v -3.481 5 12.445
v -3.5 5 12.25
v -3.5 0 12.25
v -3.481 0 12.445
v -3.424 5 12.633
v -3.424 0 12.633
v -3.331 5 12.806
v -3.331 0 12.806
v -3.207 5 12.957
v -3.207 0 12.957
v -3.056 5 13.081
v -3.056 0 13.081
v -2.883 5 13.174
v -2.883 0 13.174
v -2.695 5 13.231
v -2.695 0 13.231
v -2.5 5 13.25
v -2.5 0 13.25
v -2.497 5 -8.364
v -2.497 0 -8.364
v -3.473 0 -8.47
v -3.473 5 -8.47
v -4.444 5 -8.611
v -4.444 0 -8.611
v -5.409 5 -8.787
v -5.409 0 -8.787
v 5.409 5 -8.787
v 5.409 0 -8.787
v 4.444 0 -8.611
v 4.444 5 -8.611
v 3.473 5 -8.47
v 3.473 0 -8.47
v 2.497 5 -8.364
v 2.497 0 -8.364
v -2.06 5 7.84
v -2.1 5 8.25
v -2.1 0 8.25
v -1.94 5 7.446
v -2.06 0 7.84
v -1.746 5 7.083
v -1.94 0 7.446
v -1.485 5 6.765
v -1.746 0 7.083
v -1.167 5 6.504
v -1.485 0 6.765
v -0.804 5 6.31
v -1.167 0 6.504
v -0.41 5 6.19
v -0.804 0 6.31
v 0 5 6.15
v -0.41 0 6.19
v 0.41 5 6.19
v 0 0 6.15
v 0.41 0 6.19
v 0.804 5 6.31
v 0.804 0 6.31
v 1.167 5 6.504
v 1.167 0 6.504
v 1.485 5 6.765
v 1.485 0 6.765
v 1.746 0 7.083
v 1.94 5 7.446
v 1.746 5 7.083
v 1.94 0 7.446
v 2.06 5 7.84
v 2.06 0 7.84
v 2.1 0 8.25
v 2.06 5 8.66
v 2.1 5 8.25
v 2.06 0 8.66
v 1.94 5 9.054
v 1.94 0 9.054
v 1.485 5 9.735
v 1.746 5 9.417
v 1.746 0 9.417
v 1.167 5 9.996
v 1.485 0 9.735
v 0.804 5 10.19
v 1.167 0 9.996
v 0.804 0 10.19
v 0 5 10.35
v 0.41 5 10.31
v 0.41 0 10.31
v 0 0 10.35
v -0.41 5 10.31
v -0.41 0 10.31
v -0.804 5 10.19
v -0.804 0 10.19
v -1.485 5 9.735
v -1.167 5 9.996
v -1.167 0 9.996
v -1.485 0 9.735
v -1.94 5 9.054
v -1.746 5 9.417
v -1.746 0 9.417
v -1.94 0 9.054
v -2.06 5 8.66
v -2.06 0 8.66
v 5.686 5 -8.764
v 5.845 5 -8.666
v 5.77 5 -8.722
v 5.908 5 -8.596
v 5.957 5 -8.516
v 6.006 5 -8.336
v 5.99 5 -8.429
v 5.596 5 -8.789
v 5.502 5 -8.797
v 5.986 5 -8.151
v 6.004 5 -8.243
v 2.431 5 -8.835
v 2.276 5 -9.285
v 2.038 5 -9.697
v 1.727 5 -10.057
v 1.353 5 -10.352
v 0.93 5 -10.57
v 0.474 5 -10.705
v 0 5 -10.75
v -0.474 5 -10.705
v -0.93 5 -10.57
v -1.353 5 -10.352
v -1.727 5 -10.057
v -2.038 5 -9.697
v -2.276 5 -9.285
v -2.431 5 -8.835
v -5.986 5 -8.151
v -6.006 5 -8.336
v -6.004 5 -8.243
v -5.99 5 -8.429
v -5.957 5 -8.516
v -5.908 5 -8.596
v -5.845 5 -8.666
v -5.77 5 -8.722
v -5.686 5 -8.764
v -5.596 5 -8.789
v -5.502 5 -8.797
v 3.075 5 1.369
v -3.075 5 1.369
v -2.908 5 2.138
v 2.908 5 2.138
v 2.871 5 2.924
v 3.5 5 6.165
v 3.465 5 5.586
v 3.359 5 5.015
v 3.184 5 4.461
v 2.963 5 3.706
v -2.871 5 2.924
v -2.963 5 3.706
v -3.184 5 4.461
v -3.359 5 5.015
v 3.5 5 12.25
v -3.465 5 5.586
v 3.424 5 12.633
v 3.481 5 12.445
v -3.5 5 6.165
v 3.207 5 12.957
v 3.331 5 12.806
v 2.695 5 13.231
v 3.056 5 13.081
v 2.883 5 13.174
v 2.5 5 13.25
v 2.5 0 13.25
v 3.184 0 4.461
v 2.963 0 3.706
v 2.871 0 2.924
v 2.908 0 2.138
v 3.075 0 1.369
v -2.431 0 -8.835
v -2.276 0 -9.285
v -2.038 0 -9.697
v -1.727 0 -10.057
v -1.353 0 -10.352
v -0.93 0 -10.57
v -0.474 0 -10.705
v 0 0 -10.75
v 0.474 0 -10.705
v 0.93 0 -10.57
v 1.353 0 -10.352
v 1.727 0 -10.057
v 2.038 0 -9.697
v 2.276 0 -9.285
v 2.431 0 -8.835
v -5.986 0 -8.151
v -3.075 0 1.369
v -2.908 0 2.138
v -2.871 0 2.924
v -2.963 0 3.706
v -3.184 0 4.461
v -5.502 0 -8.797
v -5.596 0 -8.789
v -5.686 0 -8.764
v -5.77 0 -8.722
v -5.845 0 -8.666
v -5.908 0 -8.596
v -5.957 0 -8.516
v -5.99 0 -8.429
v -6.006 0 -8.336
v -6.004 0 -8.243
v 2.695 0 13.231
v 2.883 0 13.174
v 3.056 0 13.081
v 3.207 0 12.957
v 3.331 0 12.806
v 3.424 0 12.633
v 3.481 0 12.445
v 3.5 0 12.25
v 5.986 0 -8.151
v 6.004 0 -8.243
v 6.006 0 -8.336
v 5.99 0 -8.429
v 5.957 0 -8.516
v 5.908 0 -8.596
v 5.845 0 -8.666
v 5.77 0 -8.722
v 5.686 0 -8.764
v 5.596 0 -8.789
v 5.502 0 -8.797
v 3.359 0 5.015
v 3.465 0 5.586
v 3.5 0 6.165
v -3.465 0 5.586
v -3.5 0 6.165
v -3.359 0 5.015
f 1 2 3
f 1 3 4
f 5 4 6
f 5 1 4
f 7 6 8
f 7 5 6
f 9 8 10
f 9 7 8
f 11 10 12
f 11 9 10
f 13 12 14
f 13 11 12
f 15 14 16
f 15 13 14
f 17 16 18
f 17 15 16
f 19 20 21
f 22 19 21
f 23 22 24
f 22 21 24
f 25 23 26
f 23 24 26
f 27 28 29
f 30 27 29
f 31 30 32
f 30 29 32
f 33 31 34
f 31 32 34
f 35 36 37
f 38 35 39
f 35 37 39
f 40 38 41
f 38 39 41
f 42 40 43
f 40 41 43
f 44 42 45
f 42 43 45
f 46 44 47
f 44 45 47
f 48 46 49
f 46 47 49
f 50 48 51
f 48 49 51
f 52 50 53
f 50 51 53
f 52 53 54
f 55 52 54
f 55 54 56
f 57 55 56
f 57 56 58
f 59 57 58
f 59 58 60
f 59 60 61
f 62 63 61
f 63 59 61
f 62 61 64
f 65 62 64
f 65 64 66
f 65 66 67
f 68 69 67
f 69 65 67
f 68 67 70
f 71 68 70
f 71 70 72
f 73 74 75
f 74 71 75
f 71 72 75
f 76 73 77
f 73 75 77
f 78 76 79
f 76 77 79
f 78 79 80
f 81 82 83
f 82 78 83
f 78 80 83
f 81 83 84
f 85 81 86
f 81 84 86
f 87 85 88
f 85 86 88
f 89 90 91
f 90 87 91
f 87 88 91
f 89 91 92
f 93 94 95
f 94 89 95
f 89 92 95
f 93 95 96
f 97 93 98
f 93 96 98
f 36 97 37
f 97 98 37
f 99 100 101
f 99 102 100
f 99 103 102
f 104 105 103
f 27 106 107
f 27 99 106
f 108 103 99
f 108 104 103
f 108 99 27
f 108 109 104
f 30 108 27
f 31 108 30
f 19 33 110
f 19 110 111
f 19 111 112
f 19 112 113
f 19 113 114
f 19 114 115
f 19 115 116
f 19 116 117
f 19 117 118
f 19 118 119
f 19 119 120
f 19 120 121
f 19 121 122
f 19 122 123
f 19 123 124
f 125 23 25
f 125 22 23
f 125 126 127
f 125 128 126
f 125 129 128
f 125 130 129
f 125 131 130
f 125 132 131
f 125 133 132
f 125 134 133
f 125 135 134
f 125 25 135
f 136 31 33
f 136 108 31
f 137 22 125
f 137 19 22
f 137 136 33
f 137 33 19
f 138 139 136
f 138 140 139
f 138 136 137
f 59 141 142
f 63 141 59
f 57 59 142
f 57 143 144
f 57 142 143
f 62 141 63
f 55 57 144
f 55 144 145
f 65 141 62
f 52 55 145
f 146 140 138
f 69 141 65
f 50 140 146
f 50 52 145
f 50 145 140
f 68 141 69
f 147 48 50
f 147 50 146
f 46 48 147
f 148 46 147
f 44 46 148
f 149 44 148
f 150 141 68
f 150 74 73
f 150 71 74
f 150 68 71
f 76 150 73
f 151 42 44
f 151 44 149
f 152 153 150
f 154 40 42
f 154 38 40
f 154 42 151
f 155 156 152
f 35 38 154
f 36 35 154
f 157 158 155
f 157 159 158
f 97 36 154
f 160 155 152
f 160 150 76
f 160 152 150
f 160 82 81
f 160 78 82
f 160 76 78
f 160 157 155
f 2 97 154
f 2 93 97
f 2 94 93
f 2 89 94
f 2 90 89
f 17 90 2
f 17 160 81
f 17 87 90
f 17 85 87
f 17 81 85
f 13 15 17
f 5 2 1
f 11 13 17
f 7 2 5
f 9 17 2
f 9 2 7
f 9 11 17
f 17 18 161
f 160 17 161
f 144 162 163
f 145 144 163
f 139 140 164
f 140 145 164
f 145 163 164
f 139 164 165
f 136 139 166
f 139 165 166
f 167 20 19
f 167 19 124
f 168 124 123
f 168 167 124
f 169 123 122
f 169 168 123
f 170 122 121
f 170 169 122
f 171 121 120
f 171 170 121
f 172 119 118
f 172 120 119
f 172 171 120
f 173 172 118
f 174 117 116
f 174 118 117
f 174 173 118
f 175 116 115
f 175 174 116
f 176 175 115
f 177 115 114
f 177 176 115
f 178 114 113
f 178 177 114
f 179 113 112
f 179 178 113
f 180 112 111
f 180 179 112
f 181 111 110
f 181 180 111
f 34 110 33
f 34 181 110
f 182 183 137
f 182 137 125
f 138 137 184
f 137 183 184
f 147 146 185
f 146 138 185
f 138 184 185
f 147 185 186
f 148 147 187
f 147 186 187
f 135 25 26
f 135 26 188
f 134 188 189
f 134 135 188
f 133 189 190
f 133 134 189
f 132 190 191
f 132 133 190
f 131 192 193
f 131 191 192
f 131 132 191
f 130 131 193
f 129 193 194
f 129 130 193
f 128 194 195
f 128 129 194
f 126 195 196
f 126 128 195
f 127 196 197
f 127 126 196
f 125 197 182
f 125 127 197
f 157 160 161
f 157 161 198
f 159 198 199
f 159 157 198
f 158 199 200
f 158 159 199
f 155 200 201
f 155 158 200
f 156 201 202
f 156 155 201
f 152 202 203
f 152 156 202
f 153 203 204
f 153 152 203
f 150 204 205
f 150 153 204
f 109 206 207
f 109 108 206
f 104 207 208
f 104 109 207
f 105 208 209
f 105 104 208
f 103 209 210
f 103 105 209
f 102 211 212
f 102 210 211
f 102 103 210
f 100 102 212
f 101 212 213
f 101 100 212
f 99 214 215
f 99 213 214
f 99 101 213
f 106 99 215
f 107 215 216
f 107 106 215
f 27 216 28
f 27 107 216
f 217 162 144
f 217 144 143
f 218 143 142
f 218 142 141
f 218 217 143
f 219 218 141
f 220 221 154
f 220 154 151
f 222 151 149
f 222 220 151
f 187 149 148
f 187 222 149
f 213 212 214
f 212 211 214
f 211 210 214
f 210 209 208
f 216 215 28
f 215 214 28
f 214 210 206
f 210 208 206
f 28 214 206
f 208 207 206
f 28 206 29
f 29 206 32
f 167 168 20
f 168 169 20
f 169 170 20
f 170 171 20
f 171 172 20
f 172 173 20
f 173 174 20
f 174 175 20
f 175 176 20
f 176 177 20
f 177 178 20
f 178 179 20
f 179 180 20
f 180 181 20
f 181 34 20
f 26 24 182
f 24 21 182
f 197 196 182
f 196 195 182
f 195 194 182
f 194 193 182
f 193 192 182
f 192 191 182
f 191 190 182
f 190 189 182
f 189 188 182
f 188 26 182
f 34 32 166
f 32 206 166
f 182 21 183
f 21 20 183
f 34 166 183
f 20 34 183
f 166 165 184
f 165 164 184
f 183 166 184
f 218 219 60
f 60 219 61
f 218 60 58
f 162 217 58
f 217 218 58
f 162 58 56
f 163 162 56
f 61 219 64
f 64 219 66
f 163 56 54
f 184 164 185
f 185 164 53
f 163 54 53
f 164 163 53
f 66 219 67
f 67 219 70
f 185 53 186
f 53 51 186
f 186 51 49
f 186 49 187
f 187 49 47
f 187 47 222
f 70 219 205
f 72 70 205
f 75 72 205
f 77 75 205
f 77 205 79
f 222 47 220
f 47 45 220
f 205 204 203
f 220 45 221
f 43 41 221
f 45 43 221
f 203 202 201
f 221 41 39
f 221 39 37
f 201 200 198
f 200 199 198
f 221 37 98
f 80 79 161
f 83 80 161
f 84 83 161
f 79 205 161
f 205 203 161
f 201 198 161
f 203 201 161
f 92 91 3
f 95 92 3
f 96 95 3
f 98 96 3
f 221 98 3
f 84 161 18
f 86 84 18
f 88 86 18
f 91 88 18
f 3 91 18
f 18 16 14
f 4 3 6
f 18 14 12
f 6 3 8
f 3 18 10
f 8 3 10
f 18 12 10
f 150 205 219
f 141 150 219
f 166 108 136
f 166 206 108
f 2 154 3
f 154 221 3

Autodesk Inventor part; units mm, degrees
ref_plane "YZ Plane" through (0, 0, 0) normal (1, 0, 0) x (0, 1, 0)
ref_plane "XZ Plane" through (0, 0, 0) normal (0, 1, 0) x (-1, 0, 0)
ref_plane "XY Plane" through (0, 0, 0) normal (0, 0, 1) x (1, 0, 0)
sketch "Sketch1" plane through (0, 0, 0) normal (0, 1, 0) x (-1, 0, 0)
  line L0 (0, 8.25) -> (0, -8.25) construction
  line L1 (-2.5, 8.25) -> (-2.5, -8.25)
  line L2 (2.5, -8.25) -> (2.5, 8.25)
  arc A0 (2.5, 8.25) -> (-2.5, 8.25) centre (0, 8.25) ccw
  arc A1 (-2.5, -8.25) -> (2.5, -8.25) centre (0, -8.25) ccw
  circle A2 centre (0, 8.25) radius 2.1
  circle A3 centre (0, -8.25) radius 2.1
  line L3 (2.5, 13.25) -> (-2.5, 13.25)
  line L4 (-2.5, 13.25) -> (-2.5, 3.25)
  line L5 (-2.5, 3.25) -> (2.5, 3.25)
  line L6 (2.5, 3.25) -> (2.5, 13.25)
  line L7 (2.5, 13.25) -> (-2.5, 3.25) construction
  line L8 (-2.5, 13.25) -> (2.5, 3.25) construction
  line L9 (0, 8.25) -> (0, -35.75)
  circle A4 centre (0, -35.75) radius 27.5
  line L10 (-6.2348, -8.9661) -> (-2.5, 3.25)
  line L11 (2.5, 3.25) -> (6.2348, -8.9661)
  line L12 (3.5, 13.25) -> (-3.5, 13.25)
  line L13 (-3.5, 13.25) -> (-3.5, 3.25)
  line L14 (-3.5, 3.25) -> (3.5, 3.25)
  line L15 (3.5, 3.25) -> (3.5, 13.25)
  line L16 (3.5, 13.25) -> (-3.5, 3.25) construction
  line L17 (-3.5, 13.25) -> (3.5, 3.25) construction
  point P0 (0, 0)
  point P1 (-2.5, 8.25)
  point P2 (2.5, 8.25)
  point P3 (2.5, 3.25)
  point P4 (2.4974, -8.3636)
  point P5 (-2.4974, -8.3636)
  point P6 (2.5, 3.25)
  point P7 (-2.5, 3.25)
  point P8 (-2.5, 13.25)
  dimension "d1" = 2.5
  dimension "d2" = 4.2
  dimension "d6" = 10
  dimension "d7" = 16.5
  dimension "d8" = 44
  dimension "d9" = 17
  dimension "d12" = 10
  dimension "d13" = 7
extrude "Extrusion1" add sketch "Sketch1" along normal blind 5 contours A0 L2 L5 L1 | L4 L3 L6 A0 | L1 L14 L13 L12 L4 | L5 L9 A3 A4 A1 L1 | L1 A1 A4 L10 | L6 L12 L15 L14 L2 | L5 L2 A1 A4 A3 L9 | L11 A4 A1 L2 | A4 A3 L9 A1 | L9 A4 A3 | A3 A4 L9 | L9 A3 A4 A1 | A4 L9 A3 | A4 A3 L9
fillet "Fillet2" radius 0.5 2 edges at (6.2348, 2.5, -8.9661) (-6.2348, 2.5, -8.9661)
fillet "Fillet4" radius 4.75 4 edges at (3.5, 2.5, 3.25) (2.5, 2.5, 3.25) (-3.5, 2.5, 3.25) (-2.5, 2.5, 3.25)
fillet "Fillet5" radius 1 2 edges at (-3.5, 2.5, 13.25) (3.5, 2.5, 13.25)
equation "\"d12\" = d6"
properties part number "11_Chot_banh_lai"
